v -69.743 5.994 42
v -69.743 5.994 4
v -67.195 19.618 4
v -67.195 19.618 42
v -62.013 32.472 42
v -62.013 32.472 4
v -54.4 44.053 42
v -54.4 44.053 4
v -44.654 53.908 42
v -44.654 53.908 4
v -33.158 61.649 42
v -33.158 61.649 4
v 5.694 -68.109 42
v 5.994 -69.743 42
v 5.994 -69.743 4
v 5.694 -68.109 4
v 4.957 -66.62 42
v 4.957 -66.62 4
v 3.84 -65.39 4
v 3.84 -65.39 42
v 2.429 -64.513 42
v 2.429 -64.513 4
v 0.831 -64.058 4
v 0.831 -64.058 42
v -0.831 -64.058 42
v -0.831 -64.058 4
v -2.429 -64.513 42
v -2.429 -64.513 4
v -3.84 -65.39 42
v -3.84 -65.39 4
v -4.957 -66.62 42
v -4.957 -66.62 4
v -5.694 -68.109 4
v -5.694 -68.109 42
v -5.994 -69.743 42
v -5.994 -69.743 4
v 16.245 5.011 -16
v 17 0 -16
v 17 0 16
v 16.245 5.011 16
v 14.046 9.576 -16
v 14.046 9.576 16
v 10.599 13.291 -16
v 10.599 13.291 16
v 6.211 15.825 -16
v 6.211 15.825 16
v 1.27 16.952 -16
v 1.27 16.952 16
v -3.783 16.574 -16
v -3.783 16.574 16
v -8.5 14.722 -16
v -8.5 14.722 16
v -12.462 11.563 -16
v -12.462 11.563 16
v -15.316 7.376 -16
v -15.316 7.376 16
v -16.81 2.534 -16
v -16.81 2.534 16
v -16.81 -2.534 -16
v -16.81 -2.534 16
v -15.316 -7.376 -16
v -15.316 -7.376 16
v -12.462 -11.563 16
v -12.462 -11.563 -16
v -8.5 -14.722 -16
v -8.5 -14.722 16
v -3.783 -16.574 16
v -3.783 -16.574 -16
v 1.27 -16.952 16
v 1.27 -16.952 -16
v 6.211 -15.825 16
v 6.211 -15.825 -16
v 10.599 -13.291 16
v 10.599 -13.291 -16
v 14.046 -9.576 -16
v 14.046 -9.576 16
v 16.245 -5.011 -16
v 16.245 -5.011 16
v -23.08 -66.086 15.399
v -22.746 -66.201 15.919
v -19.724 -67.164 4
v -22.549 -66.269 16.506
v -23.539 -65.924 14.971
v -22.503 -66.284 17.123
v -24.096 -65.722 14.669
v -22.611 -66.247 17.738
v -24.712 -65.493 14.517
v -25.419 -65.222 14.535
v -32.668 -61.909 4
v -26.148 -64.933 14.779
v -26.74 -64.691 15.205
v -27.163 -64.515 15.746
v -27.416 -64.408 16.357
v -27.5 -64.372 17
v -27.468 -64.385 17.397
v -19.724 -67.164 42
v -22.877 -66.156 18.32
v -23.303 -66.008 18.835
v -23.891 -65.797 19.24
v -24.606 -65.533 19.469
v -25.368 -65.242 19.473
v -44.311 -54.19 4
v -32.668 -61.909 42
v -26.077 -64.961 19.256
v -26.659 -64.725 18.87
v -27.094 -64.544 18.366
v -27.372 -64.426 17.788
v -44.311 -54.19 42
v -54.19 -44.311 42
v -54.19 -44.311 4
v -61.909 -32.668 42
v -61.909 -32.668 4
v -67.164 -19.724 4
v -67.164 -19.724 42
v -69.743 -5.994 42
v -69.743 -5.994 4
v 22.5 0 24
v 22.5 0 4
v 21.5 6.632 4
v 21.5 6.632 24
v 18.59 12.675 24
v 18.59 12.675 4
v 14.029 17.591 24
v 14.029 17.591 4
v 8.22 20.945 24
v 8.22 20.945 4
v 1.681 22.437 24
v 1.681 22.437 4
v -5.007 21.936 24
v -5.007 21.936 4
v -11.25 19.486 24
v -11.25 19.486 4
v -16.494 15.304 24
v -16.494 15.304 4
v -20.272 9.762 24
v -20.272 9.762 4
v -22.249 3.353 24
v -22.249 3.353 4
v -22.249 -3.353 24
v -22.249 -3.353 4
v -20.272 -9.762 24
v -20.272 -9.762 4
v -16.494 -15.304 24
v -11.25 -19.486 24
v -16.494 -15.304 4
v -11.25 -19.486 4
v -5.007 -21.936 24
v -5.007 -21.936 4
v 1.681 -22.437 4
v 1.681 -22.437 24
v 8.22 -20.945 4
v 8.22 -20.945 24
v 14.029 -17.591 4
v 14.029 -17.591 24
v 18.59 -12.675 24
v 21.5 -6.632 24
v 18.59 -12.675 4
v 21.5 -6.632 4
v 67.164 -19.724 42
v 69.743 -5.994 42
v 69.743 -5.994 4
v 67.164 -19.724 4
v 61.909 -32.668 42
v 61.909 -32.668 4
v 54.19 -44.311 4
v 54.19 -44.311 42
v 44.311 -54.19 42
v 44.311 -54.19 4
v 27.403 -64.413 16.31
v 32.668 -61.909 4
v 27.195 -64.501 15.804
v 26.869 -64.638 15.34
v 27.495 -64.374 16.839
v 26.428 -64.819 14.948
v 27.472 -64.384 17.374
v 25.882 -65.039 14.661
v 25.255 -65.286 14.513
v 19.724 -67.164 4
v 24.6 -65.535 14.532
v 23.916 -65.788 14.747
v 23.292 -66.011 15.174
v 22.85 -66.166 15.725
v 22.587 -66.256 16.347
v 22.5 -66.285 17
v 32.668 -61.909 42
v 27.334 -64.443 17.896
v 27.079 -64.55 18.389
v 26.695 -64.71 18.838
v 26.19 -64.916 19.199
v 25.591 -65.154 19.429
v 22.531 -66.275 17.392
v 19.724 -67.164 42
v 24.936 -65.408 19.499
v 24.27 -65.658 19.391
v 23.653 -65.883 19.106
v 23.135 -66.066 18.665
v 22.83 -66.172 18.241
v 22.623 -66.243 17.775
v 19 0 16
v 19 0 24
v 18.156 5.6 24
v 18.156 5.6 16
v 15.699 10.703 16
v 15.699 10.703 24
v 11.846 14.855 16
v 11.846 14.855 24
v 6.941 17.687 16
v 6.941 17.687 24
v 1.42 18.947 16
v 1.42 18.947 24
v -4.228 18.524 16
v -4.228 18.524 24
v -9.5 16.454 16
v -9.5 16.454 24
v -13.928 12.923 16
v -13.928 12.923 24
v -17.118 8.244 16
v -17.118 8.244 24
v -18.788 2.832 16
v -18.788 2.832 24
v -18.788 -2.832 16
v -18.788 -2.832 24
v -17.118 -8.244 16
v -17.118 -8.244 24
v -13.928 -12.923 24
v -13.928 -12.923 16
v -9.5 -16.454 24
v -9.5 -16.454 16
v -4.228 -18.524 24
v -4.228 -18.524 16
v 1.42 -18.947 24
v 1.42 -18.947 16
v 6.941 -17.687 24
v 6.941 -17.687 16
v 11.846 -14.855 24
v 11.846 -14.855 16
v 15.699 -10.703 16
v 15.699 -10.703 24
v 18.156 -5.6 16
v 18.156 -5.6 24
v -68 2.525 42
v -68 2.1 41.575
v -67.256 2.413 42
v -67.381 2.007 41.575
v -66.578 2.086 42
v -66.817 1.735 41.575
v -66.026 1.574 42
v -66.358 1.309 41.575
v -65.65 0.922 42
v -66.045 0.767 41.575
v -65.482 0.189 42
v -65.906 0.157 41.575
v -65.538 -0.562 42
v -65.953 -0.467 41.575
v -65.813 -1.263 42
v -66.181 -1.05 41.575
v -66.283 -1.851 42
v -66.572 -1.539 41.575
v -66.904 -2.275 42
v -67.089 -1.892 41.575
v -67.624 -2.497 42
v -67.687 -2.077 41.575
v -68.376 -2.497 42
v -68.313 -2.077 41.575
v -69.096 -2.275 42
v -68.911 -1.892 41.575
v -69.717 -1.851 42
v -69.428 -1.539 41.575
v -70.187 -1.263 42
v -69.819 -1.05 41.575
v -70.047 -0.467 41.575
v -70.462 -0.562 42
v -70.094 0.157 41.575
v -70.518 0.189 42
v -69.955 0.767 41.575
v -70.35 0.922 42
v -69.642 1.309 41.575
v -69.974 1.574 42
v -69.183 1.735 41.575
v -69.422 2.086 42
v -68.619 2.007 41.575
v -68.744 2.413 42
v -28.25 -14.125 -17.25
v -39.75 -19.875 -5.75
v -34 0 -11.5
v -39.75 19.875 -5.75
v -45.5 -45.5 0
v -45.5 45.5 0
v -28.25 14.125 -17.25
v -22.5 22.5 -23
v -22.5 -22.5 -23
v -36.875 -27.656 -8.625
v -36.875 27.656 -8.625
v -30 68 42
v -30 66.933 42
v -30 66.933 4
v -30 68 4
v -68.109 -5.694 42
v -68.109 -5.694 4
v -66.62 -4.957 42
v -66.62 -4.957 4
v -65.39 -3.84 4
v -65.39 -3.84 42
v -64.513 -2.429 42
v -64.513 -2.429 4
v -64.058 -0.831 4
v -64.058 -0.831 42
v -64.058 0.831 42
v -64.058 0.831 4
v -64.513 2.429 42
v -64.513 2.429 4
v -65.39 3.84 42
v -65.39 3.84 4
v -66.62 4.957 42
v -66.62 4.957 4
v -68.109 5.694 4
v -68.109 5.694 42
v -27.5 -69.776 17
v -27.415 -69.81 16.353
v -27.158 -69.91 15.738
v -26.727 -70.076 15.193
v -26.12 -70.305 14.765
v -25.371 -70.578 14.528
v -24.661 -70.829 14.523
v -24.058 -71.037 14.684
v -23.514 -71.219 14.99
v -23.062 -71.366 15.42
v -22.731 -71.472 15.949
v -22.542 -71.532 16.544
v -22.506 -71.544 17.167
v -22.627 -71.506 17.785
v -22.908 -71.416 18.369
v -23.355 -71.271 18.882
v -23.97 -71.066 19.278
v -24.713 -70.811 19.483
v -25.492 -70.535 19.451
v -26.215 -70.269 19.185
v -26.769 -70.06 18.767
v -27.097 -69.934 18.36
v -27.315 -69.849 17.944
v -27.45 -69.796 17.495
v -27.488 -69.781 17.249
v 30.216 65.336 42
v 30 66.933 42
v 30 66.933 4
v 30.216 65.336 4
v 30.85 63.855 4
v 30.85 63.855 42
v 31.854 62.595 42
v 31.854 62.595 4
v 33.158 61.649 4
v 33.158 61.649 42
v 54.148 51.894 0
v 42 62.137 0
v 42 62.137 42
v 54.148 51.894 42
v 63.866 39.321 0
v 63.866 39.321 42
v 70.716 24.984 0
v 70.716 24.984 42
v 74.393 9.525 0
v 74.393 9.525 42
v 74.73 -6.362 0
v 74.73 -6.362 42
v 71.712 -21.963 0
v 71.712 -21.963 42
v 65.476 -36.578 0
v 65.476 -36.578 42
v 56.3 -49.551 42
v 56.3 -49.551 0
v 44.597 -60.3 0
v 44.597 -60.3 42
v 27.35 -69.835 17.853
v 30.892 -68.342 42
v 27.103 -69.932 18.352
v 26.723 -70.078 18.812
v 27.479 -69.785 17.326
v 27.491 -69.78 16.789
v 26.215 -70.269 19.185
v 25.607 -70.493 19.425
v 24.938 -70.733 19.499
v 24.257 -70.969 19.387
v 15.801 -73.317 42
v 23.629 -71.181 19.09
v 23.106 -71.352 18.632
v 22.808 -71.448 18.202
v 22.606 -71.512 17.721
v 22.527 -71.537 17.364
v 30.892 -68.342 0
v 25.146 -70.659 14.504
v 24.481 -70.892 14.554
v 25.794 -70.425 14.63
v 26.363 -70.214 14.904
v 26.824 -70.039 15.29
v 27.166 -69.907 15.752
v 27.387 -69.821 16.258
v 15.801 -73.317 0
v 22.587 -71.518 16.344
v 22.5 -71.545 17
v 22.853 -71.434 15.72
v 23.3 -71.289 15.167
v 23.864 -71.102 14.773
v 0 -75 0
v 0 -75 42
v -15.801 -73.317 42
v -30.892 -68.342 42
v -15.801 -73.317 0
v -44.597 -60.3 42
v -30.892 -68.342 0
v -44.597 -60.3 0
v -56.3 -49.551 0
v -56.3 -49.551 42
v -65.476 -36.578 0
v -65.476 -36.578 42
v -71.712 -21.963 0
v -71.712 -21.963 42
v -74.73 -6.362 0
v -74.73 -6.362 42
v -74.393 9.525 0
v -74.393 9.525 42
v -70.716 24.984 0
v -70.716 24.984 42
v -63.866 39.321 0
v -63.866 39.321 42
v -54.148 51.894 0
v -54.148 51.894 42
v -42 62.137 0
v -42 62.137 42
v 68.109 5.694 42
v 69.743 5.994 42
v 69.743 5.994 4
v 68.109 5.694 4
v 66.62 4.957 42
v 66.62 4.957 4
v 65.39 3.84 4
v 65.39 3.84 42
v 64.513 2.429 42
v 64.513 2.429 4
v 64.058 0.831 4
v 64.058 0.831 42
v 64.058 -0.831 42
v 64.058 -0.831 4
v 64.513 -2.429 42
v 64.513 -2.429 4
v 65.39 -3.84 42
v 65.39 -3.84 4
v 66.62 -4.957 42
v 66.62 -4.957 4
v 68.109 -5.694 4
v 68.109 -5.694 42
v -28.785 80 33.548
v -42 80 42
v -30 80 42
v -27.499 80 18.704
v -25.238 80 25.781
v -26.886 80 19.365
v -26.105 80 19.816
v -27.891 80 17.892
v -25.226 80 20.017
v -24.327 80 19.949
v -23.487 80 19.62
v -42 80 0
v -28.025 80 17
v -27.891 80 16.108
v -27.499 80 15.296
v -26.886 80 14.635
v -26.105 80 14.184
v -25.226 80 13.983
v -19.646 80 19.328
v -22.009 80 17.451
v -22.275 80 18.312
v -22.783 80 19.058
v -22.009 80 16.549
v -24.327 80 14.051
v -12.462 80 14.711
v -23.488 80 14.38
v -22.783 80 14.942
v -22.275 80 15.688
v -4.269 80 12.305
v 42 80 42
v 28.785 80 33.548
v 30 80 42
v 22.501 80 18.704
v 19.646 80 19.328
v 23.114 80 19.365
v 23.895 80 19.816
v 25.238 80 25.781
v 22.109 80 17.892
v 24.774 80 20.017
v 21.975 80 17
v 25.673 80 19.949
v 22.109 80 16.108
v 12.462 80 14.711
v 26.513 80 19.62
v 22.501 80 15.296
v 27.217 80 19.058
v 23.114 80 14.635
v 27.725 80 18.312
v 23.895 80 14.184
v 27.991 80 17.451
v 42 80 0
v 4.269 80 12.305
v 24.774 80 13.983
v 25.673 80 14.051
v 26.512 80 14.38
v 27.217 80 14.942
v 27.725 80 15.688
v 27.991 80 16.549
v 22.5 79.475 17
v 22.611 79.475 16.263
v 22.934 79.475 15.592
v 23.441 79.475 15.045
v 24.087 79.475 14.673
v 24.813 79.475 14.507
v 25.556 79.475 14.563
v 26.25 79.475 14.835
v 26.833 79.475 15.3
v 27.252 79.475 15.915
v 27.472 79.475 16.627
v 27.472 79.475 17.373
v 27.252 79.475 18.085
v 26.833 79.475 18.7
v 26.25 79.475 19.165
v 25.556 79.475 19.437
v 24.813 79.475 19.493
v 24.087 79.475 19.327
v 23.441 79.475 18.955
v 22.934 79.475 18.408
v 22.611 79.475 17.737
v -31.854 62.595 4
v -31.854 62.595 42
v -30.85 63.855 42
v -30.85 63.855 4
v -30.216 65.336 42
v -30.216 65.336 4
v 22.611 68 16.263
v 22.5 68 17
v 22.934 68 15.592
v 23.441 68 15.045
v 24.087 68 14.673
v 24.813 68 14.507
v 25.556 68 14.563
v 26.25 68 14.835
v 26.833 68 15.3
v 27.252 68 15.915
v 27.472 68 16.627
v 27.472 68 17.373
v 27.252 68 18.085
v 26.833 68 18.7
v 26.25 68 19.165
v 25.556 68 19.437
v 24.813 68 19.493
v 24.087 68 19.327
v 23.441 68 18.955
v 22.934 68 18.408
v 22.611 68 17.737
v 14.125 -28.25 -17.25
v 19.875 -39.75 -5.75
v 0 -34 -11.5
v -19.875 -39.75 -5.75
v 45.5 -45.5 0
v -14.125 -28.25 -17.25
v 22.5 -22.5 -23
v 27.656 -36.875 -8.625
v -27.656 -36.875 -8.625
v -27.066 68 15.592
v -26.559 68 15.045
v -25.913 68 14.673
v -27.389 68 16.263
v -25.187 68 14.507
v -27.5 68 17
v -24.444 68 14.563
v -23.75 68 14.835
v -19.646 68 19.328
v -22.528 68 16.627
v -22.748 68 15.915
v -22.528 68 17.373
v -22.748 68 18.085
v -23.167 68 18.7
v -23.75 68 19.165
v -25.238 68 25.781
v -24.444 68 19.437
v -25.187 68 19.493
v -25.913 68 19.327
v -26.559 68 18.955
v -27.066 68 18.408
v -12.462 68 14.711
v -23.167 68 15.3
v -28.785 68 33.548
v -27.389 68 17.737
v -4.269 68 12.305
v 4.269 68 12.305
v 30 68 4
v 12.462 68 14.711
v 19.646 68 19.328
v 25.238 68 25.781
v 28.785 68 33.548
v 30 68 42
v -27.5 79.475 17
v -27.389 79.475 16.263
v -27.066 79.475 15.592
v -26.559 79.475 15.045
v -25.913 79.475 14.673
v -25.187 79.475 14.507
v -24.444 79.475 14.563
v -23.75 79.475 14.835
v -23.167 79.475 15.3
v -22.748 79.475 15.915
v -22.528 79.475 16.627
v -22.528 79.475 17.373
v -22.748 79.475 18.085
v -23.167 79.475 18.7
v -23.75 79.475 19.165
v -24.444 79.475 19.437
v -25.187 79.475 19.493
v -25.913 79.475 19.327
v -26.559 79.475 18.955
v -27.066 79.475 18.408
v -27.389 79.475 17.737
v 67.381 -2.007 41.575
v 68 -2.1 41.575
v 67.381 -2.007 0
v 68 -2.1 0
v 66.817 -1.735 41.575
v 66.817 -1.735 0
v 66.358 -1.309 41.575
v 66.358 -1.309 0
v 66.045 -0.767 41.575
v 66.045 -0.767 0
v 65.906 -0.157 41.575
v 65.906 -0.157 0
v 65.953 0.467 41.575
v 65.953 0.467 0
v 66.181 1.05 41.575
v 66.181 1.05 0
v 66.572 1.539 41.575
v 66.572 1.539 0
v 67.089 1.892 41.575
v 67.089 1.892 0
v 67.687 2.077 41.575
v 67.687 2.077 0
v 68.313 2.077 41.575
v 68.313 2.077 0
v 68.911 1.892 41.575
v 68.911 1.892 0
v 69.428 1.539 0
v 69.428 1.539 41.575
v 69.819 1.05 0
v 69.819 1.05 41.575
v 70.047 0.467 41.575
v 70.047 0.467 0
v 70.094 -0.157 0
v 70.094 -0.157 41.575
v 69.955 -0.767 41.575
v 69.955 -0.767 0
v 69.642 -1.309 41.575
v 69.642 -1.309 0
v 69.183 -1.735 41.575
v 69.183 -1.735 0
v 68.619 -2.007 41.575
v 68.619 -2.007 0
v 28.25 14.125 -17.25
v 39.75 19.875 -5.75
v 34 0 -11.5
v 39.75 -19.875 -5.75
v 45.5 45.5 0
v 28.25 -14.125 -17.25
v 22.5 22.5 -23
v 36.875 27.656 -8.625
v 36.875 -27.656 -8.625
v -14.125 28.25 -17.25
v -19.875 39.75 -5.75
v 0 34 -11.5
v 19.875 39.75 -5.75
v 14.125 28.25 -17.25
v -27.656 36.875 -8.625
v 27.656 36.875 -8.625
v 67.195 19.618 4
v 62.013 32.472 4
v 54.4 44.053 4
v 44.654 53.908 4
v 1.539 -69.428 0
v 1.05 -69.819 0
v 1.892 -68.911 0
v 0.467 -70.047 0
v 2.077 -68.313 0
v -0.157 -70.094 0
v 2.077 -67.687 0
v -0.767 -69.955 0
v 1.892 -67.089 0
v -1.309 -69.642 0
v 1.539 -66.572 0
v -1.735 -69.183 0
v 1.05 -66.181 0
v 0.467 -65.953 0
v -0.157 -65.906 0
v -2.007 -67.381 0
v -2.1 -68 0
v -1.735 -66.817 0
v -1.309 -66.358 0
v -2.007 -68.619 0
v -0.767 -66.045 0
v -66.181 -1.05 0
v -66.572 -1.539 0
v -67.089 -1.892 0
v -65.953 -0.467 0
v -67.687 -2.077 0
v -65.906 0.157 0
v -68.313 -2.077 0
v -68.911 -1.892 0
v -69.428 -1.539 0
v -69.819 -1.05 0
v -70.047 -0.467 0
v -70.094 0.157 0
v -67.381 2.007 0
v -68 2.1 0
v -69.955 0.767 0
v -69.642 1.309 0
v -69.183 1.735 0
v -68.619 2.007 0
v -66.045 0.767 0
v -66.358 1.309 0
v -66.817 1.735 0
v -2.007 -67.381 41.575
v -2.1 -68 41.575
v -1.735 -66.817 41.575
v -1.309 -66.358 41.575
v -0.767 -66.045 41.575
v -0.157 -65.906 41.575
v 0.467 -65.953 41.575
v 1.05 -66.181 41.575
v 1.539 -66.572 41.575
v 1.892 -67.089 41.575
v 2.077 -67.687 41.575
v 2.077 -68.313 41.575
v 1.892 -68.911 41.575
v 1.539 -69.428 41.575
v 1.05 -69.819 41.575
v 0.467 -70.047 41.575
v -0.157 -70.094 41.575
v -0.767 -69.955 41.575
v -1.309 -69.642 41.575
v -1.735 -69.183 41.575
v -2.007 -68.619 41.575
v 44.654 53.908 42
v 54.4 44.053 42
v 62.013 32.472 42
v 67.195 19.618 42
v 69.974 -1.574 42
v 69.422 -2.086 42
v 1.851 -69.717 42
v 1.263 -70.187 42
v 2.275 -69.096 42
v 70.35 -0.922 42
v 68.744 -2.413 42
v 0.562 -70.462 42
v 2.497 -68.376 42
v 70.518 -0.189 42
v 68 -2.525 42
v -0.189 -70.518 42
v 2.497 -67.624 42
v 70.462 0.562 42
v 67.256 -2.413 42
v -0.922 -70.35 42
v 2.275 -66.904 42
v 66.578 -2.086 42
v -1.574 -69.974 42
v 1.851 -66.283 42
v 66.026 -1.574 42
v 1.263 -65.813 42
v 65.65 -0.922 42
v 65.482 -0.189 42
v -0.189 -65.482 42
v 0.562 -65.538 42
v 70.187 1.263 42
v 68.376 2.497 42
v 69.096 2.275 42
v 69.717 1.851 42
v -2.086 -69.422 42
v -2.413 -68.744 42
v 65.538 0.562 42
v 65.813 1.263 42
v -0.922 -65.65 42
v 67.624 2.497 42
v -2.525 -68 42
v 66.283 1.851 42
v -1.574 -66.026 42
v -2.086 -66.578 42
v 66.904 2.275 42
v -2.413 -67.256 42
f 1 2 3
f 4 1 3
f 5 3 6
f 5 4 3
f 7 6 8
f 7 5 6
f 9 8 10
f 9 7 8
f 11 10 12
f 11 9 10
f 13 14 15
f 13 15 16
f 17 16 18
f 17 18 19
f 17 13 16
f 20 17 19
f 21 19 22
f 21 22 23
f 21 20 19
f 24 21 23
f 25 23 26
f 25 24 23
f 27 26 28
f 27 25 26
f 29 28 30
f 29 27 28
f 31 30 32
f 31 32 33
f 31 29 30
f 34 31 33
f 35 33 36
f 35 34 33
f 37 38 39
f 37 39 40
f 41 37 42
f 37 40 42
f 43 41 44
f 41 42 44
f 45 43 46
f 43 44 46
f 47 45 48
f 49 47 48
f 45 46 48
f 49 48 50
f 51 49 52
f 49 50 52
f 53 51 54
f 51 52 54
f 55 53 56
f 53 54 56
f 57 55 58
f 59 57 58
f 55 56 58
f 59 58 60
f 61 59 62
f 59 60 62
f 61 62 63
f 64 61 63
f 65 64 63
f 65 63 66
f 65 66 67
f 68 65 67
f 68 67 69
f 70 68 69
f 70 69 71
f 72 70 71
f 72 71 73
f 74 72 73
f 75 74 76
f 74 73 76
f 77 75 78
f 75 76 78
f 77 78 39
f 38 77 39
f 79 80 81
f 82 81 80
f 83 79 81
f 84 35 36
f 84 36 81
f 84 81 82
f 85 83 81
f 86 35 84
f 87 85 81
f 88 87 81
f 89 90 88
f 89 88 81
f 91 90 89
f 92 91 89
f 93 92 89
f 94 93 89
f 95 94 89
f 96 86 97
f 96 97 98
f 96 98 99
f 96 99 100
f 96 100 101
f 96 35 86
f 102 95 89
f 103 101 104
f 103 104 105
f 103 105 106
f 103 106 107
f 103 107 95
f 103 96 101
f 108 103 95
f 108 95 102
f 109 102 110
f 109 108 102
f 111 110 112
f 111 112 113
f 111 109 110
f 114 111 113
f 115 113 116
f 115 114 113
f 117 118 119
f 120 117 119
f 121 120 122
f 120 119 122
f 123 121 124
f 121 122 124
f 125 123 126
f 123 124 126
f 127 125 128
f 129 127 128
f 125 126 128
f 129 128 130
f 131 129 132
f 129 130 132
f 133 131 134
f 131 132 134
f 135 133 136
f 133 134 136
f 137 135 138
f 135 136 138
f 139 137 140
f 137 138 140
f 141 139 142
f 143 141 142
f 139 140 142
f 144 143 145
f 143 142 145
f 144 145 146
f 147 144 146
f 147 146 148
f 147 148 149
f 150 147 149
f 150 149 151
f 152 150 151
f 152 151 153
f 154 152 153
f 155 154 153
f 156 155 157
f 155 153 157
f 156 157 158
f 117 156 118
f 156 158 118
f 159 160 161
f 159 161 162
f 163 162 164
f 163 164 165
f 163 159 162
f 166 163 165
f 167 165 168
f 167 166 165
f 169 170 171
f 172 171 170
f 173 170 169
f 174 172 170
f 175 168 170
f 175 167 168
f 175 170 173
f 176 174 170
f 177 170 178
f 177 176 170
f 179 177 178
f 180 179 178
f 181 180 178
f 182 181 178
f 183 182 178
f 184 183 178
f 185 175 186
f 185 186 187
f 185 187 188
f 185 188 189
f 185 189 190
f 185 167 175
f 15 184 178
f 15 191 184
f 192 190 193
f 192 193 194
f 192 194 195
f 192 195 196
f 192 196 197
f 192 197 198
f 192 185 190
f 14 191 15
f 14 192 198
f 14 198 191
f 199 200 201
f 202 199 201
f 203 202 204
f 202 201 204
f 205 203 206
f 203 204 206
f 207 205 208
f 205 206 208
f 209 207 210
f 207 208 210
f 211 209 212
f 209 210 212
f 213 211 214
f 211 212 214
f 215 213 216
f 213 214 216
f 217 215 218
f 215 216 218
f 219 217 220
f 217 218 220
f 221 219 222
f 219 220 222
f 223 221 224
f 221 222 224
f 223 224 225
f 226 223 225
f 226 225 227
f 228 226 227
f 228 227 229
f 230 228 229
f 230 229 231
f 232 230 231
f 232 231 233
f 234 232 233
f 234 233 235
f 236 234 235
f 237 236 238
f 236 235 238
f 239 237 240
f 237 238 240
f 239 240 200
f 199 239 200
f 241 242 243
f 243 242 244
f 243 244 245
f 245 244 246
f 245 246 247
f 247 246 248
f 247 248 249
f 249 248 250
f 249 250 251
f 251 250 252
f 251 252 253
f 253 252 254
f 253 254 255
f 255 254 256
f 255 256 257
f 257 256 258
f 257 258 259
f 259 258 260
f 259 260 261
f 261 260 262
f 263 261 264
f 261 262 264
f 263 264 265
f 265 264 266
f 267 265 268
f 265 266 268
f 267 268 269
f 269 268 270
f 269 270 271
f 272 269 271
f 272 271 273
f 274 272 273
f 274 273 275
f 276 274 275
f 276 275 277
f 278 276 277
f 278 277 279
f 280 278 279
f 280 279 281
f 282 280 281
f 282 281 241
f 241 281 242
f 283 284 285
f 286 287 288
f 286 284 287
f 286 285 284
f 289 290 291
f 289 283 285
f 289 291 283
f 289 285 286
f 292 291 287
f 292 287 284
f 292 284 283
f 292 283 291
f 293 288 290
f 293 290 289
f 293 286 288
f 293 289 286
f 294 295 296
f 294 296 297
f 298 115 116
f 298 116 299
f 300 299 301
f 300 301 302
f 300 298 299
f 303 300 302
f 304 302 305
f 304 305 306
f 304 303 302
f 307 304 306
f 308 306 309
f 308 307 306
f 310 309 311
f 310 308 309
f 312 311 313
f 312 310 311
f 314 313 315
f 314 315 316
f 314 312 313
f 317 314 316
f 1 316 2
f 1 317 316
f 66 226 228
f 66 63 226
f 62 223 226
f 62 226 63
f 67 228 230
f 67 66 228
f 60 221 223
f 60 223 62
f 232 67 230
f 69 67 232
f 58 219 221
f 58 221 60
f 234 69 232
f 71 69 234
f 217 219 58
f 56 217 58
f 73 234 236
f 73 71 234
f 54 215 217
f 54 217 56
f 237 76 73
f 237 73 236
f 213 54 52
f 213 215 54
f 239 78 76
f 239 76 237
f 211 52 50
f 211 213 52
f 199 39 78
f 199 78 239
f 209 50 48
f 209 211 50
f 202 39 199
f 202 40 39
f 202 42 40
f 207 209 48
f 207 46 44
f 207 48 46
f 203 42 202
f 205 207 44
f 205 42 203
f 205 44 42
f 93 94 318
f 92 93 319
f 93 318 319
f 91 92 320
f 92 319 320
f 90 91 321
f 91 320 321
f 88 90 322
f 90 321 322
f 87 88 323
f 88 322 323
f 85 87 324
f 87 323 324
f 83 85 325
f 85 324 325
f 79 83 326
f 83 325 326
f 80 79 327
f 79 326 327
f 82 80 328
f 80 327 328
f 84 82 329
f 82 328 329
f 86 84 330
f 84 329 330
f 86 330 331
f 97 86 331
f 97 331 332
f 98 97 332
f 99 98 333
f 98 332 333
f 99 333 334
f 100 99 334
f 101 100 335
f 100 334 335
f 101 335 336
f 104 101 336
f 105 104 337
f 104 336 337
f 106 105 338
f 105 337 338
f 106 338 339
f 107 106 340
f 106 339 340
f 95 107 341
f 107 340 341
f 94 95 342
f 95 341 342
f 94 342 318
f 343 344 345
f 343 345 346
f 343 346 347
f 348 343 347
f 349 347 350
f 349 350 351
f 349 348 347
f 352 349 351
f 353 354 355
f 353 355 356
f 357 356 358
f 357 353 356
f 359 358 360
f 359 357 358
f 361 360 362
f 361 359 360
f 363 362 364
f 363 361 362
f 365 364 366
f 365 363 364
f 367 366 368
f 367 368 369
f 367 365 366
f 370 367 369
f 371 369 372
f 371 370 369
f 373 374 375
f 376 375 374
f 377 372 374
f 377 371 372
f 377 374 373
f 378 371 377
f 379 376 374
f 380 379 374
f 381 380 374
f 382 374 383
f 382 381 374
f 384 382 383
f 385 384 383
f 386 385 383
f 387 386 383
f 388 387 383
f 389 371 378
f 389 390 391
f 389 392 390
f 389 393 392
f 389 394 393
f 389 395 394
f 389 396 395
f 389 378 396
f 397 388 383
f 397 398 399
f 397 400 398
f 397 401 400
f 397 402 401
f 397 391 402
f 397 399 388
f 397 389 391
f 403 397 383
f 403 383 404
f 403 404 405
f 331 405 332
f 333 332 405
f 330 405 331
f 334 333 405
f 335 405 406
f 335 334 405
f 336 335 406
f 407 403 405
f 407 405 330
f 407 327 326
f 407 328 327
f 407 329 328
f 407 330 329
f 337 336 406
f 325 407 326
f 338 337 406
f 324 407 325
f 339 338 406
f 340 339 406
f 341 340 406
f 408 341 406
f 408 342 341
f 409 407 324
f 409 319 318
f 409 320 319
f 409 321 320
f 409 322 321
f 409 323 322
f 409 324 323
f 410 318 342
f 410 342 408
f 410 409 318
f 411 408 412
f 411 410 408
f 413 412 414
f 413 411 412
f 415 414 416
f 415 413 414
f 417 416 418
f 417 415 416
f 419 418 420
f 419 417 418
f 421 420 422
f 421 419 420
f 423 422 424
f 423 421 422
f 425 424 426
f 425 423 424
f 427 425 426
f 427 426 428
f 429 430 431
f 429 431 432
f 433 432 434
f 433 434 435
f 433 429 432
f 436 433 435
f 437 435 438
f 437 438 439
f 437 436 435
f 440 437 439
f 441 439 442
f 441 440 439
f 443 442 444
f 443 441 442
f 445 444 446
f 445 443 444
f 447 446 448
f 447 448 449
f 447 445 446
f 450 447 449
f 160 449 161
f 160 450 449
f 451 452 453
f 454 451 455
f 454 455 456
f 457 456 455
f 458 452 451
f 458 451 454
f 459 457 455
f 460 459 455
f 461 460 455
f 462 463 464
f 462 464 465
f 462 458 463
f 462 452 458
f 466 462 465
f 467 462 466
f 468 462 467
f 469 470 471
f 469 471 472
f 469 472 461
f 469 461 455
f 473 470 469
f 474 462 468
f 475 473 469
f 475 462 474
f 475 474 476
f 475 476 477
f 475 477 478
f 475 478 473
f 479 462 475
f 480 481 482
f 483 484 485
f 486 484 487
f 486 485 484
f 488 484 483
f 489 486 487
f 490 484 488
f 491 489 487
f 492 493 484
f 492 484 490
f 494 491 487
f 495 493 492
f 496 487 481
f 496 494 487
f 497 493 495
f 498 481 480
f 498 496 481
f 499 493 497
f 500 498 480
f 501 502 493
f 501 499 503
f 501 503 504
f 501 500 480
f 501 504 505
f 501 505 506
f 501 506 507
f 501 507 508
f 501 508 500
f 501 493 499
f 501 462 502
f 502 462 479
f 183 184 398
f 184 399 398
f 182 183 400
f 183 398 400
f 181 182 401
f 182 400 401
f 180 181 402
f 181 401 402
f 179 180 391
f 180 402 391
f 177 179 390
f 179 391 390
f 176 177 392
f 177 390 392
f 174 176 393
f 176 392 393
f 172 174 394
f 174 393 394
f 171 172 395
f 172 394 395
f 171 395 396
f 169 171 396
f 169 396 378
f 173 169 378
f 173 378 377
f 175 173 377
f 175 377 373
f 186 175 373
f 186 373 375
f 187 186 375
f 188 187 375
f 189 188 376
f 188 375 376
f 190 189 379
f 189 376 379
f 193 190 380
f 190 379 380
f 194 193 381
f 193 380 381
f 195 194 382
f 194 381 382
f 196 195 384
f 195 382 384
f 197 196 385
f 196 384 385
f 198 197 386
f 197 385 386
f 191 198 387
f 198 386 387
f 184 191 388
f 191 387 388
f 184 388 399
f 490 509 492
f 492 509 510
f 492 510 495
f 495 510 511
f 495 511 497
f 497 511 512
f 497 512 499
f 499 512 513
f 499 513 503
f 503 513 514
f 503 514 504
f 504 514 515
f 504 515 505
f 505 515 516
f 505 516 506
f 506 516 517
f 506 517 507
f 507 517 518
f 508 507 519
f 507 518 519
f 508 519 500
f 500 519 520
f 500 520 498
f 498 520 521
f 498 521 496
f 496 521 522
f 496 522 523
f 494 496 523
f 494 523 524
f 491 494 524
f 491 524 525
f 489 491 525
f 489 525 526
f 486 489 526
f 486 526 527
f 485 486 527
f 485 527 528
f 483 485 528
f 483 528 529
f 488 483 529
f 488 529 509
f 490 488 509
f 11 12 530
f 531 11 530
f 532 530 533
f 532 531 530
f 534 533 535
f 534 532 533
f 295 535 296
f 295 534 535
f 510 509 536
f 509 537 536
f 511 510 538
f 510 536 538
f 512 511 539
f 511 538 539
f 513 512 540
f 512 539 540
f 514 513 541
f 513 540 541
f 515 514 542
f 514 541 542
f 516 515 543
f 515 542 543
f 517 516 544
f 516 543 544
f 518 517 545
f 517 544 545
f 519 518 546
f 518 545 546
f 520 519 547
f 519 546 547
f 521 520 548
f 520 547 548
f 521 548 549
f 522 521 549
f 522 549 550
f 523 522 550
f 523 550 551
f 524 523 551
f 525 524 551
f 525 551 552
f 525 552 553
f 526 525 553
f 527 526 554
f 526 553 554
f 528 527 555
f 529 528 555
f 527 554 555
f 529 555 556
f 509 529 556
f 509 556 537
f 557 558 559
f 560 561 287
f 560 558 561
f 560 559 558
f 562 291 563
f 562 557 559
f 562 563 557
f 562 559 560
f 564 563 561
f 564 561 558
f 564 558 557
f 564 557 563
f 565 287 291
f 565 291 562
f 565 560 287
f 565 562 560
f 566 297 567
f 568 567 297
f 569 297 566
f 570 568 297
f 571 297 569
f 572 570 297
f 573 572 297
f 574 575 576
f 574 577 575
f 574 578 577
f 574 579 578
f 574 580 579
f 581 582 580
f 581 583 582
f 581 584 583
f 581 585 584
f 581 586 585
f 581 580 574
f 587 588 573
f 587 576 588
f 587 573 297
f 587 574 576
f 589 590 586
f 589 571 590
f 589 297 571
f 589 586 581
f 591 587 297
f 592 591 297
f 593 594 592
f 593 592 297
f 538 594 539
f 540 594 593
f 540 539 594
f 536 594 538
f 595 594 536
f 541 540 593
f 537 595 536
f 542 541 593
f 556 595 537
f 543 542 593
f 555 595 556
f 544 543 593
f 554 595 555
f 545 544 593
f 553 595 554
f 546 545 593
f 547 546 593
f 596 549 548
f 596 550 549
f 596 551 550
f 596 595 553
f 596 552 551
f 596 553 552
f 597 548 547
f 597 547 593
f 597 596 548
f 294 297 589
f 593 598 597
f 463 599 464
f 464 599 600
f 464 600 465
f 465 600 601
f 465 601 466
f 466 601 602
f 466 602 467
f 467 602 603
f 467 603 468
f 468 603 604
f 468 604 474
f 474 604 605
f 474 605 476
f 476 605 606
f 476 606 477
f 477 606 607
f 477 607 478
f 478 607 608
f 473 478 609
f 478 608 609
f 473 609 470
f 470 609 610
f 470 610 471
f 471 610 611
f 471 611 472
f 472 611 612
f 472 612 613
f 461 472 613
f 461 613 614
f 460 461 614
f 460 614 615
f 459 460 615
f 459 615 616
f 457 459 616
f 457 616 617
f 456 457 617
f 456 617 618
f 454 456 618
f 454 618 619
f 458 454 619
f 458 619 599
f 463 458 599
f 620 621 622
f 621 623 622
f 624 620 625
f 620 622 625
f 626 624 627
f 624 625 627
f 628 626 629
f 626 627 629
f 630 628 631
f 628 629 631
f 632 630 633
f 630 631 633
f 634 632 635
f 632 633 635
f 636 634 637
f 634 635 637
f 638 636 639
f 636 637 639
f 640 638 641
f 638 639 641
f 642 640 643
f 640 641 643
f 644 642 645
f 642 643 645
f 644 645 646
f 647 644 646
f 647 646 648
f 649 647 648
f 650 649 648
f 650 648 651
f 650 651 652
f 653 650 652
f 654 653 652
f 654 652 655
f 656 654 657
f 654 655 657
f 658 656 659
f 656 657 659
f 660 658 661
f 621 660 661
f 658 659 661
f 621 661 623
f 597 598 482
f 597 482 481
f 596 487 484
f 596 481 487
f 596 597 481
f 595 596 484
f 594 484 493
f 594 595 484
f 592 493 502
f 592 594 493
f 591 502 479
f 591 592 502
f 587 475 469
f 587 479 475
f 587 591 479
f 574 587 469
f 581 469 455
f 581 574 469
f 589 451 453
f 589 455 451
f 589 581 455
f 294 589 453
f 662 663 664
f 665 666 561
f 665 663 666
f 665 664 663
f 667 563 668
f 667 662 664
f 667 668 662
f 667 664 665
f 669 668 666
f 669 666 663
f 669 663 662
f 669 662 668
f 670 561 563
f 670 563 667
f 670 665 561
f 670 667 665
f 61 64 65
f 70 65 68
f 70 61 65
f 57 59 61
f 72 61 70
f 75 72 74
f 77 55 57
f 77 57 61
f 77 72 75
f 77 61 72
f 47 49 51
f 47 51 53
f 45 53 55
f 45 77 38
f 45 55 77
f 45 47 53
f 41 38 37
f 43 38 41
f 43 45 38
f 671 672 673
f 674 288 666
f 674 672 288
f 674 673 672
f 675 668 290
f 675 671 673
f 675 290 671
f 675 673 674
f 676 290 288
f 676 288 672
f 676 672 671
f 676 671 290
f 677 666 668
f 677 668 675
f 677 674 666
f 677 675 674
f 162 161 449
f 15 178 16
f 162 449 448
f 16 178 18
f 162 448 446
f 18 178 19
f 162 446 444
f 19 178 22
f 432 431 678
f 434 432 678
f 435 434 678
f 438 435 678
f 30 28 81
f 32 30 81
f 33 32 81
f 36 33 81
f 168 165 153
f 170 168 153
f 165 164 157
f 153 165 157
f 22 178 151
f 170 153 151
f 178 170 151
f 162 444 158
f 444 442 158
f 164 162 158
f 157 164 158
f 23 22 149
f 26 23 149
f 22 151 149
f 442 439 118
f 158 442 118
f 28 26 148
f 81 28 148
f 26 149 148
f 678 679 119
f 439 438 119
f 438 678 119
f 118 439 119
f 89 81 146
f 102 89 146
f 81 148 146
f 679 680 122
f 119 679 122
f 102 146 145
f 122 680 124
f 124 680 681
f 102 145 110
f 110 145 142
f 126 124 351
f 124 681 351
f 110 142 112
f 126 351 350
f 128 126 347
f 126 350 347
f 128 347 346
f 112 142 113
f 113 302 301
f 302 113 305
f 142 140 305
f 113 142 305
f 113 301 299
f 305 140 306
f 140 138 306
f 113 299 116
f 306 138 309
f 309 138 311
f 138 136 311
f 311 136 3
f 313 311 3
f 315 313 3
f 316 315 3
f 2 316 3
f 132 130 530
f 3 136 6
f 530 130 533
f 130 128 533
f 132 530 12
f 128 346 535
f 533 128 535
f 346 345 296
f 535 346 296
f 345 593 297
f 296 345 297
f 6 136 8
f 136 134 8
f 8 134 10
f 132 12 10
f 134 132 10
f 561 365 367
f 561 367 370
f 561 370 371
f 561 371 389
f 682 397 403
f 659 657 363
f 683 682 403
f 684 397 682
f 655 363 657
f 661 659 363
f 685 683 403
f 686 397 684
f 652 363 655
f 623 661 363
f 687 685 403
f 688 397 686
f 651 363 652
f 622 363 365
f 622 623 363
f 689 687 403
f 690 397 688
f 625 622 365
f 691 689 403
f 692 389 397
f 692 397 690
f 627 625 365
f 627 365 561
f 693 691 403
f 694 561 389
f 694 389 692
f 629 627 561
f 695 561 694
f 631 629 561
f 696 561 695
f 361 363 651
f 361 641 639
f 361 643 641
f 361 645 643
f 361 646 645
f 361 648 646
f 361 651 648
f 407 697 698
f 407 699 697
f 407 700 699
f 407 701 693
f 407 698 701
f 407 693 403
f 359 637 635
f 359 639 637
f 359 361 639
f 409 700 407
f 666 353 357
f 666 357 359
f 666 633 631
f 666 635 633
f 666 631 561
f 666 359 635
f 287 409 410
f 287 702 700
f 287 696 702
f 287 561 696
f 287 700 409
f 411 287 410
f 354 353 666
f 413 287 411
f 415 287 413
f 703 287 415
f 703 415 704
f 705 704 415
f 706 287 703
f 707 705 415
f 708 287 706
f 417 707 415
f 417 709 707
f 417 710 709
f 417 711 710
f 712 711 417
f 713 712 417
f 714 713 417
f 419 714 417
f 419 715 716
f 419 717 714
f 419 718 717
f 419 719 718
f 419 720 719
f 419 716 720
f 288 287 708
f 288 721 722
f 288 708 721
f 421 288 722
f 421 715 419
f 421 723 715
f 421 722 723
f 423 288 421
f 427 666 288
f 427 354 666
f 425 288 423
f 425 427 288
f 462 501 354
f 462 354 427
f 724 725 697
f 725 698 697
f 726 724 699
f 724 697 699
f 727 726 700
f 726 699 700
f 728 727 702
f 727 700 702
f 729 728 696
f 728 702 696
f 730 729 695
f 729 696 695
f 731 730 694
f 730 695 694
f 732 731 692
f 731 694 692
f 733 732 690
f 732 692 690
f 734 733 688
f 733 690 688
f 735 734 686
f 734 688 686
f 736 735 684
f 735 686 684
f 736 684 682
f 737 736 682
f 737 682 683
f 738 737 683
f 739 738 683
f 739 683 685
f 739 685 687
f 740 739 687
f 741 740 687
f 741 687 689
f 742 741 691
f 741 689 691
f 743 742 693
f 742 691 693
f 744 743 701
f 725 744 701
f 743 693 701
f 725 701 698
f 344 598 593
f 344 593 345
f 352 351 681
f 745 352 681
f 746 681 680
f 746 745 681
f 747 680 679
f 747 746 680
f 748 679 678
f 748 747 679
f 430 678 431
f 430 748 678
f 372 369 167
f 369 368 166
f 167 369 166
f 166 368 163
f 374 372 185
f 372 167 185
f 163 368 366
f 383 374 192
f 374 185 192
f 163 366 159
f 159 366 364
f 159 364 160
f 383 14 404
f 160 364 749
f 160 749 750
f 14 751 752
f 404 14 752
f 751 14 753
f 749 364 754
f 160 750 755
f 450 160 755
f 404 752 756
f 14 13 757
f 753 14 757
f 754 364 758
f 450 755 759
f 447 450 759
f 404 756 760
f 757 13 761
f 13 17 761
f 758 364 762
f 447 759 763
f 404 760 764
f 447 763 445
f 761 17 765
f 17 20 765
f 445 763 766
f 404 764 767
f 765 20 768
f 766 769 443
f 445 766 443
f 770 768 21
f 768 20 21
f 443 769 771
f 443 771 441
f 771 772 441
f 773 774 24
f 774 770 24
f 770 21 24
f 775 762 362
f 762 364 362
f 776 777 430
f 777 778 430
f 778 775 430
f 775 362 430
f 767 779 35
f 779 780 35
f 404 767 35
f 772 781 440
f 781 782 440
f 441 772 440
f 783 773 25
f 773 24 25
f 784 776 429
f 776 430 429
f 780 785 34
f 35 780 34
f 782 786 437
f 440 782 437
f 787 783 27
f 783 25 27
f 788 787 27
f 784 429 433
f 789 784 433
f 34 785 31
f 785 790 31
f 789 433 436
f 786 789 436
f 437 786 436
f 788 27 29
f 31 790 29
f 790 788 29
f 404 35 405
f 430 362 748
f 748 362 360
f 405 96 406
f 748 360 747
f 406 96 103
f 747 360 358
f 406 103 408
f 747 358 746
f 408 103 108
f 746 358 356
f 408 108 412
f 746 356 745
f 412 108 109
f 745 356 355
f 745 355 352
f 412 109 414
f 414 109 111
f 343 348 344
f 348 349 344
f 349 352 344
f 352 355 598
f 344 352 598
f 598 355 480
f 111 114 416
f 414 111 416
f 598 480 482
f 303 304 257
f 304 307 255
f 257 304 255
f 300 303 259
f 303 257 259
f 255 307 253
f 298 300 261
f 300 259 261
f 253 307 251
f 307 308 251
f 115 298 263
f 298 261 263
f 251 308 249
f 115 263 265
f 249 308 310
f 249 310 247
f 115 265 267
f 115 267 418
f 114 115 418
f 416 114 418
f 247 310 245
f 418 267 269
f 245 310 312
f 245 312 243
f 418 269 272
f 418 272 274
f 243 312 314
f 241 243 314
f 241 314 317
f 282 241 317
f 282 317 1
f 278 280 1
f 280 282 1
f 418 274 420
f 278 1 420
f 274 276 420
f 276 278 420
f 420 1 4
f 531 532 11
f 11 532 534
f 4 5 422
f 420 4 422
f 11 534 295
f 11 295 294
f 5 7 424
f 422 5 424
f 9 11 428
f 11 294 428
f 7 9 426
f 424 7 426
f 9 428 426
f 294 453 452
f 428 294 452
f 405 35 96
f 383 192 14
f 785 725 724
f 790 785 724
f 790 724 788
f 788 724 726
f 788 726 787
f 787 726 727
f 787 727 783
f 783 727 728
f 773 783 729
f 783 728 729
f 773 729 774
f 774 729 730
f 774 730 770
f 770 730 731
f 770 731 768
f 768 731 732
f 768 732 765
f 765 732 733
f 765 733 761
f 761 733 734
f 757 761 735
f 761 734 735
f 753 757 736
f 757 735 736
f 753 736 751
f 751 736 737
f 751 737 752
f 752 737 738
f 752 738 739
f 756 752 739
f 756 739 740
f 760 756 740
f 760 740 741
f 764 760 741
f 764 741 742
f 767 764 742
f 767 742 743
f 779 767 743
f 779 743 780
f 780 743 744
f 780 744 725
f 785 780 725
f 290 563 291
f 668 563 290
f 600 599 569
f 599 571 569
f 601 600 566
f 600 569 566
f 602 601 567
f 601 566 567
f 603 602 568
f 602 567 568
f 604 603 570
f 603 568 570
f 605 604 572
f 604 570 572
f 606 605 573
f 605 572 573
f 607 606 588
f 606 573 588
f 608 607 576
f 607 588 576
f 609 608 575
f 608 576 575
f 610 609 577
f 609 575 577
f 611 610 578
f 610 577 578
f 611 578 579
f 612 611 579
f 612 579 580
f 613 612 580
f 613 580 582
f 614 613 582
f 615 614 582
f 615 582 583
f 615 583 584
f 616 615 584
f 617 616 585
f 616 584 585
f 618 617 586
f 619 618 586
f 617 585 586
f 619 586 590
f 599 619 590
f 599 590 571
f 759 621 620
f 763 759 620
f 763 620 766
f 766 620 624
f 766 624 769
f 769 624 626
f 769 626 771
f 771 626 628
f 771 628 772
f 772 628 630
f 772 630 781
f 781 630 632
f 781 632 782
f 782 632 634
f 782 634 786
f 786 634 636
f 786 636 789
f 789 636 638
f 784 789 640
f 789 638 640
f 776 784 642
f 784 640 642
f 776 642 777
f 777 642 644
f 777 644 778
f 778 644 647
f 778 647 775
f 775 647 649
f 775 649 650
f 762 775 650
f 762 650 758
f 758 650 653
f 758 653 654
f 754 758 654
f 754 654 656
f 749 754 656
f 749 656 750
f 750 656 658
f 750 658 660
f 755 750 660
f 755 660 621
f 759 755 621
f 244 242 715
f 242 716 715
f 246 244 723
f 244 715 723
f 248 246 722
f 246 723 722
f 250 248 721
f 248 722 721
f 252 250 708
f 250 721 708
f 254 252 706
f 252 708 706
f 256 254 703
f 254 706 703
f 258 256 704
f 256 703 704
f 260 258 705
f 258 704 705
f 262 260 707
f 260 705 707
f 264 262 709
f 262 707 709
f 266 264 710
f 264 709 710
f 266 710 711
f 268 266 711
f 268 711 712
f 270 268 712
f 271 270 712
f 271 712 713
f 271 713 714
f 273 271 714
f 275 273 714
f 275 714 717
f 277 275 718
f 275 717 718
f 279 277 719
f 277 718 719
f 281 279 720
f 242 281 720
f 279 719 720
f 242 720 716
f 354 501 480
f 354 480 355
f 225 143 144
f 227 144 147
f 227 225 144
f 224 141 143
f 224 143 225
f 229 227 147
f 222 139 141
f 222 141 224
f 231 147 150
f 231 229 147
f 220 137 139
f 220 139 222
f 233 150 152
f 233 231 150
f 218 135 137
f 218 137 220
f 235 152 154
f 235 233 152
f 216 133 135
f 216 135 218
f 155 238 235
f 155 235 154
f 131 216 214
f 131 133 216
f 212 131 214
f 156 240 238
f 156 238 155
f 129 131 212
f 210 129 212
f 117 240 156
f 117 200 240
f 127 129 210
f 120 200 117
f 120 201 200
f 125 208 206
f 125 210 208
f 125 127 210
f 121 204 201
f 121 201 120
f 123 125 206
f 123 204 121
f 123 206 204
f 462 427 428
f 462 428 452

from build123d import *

# Parameters (mm, degrees)
EXTRUDE_1_DEPTH              = 42
CUT_EXTRUDE_1_DEPTH          = 38
HOLE_WIZARD_M5_1_D           = 4.2
HOLE_WIZARD_M5_1_CSINK_D     = 5.05
HOLE_WIZARD_M5_1_CSINK_ANGLE = 90
PATTERN_CIRCULAR_1_COUNT     = 4
CUT_EXTRUDE_3_REACH          = 119.427
SKETCH_6_R                   = 30
HOLE_WIZARD_M6_1_D           = 5
HOLE_WIZARD_M6_1_CSINK_D     = 6.05
HOLE_WIZARD_M6_1_CSINK_ANGLE = 90
SKETCH_9_W                   = 91
SKETCH_9_H                   = 91
EXTRUDE_2_DEPTH              = 23
EXTRUDE_2_TAPER              = 45
SKETCH_10_R                  = 22.5
EXTRUDE_3_DEPTH              = 20
SKETCH_11_R                  = 19
CUT_EXTRUDE_4_DEPTH          = 8
SKETCH_12_R                  = 17
CUT_EXTRUDE_5_DEPTH          = 32


with BuildPart() as part:
    # 草图1 → 凸台-拉伸1 (new body)
    with BuildSketch(Plane.XY):
        with BuildLine():
            Line((-42, 62.136945532), (-42, 80))
            Line((-42, 80), (42, 80))
            Line((42, 80), (42, 62.136945532))
            ThreePointArc((42, 62.136945532), (0, -75), (-42, 62.136945532))
        make_face()
    extrude(amount=EXTRUDE_1_DEPTH)

    # 草图2 → 切除-拉伸1 (cut)
    with BuildSketch(Plane.XY.offset(42)):
        with BuildLine():
            Line((-30, 66.932802123), (-30, 68))
            Line((-30, 68), (30, 68))
            Line((30, 68), (30, 66.932802123))
            ThreePointArc((30, 66.932802123), (30.849629548, 63.854867066), (33.157894737, 61.648633534))
            ThreePointArc((33.157894737, 61.648633534), (58.493479839, 38.451434516), (69.742857143, 5.994487263))
            ThreePointArc((69.742857143, 5.994487263), (64, 0), (69.742857143, -5.994487263))
            ThreePointArc((69.742857143, -5.994487263), (49.497474683, -49.497474683), (5.994487263, -69.742857143))
            ThreePointArc((5.994487263, -69.742857143), (0, -64), (-5.994487263, -69.742857143))
            ThreePointArc((-5.994487263, -69.742857143), (-49.497474683, -49.497474683), (-69.742857143, -5.994487263))
            ThreePointArc((-69.742857143, -5.994487263), (-64, 0), (-69.742857143, 5.994487263))
            ThreePointArc((-69.742857143, 5.994487263), (-58.493479839, 38.451434516), (-33.157894737, 61.648633534))
            ThreePointArc((-33.157894737, 61.648633534), (-30.849629548, 63.854867066), (-30, 66.932802123))
        make_face()
    extrude(amount=-CUT_EXTRUDE_1_DEPTH, mode=Mode.SUBTRACT)

    # M5 螺纹孔1 (through all)
    with Locations(Plane.XY.offset(42)):
        with Locations((0, -68)):
            hole_wizard_m5_1 = CounterSinkHole(HOLE_WIZARD_M5_1_D / 2, HOLE_WIZARD_M5_1_CSINK_D / 2, counter_sink_angle=HOLE_WIZARD_M5_1_CSINK_ANGLE)

    # 阵列(圆周)1: M5 螺纹孔1 ×4 about axis, 1 skipped
    pattern_circular_1_axis = Axis((0, 0, 0), (0, 0, -1))
    add([hole_wizard_m5_1.rotate(pattern_circular_1_axis, i * 360 / PATTERN_CIRCULAR_1_COUNT) for i in range(1, PATTERN_CIRCULAR_1_COUNT) if i not in (2,)], mode=Mode.SUBTRACT)

    # 草图6 → 切除-拉伸3 (cut, up to next)
    with BuildSketch(Plane(origin=(0, 0, 0), x_dir=(1, 0, 0), z_dir=(0, 1, 0)), mode=Mode.PRIVATE) as cut_extrude_3_sk1:
        with Locations((0, -42)):
            Circle(SKETCH_6_R)
    cut_extrude_3_tool1 = extrude(cut_extrude_3_sk1.sketch, amount=CUT_EXTRUDE_3_REACH, mode=Mode.PRIVATE) & part.part
    add(cut_extrude_3_tool1.solids().sort_by_distance((0, 0, 42))[0], mode=Mode.SUBTRACT)

    # M6 螺纹孔1 (through all)
    with Locations(Plane(origin=(0, 80, 0), x_dir=(1, 0, 0), z_dir=(0, 1, 0))):
        with Locations((25, -17), (-25, -17)):
            CounterSinkHole(HOLE_WIZARD_M6_1_D / 2, HOLE_WIZARD_M6_1_CSINK_D / 2, counter_sink_angle=HOLE_WIZARD_M6_1_CSINK_ANGLE)

    # 草图9 → 凸台-拉伸2 (add)
    with BuildSketch(Plane(origin=(0, 0, 0), x_dir=(-1, 0, 0), z_dir=(0, 0, -1))):
        Rectangle(SKETCH_9_W, SKETCH_9_H)
    extrude(amount=EXTRUDE_2_DEPTH, taper=EXTRUDE_2_TAPER)

    # 草图10 → 凸台-拉伸3 (add)
    with BuildSketch(Plane.XY.offset(4)):
        Circle(SKETCH_10_R)
    extrude(amount=EXTRUDE_3_DEPTH)

    # 草图11 → 切除-拉伸4 (cut)
    with BuildSketch(Plane.XY.offset(24)):
        Circle(SKETCH_11_R)
    extrude(amount=-CUT_EXTRUDE_4_DEPTH, mode=Mode.SUBTRACT)

    # 草图12 → 切除-拉伸5 (cut)
    with BuildSketch(Plane.XY.offset(16)):
        Circle(SKETCH_12_R)
    extrude(amount=-CUT_EXTRUDE_5_DEPTH, mode=Mode.SUBTRACT)


solid = part.part
